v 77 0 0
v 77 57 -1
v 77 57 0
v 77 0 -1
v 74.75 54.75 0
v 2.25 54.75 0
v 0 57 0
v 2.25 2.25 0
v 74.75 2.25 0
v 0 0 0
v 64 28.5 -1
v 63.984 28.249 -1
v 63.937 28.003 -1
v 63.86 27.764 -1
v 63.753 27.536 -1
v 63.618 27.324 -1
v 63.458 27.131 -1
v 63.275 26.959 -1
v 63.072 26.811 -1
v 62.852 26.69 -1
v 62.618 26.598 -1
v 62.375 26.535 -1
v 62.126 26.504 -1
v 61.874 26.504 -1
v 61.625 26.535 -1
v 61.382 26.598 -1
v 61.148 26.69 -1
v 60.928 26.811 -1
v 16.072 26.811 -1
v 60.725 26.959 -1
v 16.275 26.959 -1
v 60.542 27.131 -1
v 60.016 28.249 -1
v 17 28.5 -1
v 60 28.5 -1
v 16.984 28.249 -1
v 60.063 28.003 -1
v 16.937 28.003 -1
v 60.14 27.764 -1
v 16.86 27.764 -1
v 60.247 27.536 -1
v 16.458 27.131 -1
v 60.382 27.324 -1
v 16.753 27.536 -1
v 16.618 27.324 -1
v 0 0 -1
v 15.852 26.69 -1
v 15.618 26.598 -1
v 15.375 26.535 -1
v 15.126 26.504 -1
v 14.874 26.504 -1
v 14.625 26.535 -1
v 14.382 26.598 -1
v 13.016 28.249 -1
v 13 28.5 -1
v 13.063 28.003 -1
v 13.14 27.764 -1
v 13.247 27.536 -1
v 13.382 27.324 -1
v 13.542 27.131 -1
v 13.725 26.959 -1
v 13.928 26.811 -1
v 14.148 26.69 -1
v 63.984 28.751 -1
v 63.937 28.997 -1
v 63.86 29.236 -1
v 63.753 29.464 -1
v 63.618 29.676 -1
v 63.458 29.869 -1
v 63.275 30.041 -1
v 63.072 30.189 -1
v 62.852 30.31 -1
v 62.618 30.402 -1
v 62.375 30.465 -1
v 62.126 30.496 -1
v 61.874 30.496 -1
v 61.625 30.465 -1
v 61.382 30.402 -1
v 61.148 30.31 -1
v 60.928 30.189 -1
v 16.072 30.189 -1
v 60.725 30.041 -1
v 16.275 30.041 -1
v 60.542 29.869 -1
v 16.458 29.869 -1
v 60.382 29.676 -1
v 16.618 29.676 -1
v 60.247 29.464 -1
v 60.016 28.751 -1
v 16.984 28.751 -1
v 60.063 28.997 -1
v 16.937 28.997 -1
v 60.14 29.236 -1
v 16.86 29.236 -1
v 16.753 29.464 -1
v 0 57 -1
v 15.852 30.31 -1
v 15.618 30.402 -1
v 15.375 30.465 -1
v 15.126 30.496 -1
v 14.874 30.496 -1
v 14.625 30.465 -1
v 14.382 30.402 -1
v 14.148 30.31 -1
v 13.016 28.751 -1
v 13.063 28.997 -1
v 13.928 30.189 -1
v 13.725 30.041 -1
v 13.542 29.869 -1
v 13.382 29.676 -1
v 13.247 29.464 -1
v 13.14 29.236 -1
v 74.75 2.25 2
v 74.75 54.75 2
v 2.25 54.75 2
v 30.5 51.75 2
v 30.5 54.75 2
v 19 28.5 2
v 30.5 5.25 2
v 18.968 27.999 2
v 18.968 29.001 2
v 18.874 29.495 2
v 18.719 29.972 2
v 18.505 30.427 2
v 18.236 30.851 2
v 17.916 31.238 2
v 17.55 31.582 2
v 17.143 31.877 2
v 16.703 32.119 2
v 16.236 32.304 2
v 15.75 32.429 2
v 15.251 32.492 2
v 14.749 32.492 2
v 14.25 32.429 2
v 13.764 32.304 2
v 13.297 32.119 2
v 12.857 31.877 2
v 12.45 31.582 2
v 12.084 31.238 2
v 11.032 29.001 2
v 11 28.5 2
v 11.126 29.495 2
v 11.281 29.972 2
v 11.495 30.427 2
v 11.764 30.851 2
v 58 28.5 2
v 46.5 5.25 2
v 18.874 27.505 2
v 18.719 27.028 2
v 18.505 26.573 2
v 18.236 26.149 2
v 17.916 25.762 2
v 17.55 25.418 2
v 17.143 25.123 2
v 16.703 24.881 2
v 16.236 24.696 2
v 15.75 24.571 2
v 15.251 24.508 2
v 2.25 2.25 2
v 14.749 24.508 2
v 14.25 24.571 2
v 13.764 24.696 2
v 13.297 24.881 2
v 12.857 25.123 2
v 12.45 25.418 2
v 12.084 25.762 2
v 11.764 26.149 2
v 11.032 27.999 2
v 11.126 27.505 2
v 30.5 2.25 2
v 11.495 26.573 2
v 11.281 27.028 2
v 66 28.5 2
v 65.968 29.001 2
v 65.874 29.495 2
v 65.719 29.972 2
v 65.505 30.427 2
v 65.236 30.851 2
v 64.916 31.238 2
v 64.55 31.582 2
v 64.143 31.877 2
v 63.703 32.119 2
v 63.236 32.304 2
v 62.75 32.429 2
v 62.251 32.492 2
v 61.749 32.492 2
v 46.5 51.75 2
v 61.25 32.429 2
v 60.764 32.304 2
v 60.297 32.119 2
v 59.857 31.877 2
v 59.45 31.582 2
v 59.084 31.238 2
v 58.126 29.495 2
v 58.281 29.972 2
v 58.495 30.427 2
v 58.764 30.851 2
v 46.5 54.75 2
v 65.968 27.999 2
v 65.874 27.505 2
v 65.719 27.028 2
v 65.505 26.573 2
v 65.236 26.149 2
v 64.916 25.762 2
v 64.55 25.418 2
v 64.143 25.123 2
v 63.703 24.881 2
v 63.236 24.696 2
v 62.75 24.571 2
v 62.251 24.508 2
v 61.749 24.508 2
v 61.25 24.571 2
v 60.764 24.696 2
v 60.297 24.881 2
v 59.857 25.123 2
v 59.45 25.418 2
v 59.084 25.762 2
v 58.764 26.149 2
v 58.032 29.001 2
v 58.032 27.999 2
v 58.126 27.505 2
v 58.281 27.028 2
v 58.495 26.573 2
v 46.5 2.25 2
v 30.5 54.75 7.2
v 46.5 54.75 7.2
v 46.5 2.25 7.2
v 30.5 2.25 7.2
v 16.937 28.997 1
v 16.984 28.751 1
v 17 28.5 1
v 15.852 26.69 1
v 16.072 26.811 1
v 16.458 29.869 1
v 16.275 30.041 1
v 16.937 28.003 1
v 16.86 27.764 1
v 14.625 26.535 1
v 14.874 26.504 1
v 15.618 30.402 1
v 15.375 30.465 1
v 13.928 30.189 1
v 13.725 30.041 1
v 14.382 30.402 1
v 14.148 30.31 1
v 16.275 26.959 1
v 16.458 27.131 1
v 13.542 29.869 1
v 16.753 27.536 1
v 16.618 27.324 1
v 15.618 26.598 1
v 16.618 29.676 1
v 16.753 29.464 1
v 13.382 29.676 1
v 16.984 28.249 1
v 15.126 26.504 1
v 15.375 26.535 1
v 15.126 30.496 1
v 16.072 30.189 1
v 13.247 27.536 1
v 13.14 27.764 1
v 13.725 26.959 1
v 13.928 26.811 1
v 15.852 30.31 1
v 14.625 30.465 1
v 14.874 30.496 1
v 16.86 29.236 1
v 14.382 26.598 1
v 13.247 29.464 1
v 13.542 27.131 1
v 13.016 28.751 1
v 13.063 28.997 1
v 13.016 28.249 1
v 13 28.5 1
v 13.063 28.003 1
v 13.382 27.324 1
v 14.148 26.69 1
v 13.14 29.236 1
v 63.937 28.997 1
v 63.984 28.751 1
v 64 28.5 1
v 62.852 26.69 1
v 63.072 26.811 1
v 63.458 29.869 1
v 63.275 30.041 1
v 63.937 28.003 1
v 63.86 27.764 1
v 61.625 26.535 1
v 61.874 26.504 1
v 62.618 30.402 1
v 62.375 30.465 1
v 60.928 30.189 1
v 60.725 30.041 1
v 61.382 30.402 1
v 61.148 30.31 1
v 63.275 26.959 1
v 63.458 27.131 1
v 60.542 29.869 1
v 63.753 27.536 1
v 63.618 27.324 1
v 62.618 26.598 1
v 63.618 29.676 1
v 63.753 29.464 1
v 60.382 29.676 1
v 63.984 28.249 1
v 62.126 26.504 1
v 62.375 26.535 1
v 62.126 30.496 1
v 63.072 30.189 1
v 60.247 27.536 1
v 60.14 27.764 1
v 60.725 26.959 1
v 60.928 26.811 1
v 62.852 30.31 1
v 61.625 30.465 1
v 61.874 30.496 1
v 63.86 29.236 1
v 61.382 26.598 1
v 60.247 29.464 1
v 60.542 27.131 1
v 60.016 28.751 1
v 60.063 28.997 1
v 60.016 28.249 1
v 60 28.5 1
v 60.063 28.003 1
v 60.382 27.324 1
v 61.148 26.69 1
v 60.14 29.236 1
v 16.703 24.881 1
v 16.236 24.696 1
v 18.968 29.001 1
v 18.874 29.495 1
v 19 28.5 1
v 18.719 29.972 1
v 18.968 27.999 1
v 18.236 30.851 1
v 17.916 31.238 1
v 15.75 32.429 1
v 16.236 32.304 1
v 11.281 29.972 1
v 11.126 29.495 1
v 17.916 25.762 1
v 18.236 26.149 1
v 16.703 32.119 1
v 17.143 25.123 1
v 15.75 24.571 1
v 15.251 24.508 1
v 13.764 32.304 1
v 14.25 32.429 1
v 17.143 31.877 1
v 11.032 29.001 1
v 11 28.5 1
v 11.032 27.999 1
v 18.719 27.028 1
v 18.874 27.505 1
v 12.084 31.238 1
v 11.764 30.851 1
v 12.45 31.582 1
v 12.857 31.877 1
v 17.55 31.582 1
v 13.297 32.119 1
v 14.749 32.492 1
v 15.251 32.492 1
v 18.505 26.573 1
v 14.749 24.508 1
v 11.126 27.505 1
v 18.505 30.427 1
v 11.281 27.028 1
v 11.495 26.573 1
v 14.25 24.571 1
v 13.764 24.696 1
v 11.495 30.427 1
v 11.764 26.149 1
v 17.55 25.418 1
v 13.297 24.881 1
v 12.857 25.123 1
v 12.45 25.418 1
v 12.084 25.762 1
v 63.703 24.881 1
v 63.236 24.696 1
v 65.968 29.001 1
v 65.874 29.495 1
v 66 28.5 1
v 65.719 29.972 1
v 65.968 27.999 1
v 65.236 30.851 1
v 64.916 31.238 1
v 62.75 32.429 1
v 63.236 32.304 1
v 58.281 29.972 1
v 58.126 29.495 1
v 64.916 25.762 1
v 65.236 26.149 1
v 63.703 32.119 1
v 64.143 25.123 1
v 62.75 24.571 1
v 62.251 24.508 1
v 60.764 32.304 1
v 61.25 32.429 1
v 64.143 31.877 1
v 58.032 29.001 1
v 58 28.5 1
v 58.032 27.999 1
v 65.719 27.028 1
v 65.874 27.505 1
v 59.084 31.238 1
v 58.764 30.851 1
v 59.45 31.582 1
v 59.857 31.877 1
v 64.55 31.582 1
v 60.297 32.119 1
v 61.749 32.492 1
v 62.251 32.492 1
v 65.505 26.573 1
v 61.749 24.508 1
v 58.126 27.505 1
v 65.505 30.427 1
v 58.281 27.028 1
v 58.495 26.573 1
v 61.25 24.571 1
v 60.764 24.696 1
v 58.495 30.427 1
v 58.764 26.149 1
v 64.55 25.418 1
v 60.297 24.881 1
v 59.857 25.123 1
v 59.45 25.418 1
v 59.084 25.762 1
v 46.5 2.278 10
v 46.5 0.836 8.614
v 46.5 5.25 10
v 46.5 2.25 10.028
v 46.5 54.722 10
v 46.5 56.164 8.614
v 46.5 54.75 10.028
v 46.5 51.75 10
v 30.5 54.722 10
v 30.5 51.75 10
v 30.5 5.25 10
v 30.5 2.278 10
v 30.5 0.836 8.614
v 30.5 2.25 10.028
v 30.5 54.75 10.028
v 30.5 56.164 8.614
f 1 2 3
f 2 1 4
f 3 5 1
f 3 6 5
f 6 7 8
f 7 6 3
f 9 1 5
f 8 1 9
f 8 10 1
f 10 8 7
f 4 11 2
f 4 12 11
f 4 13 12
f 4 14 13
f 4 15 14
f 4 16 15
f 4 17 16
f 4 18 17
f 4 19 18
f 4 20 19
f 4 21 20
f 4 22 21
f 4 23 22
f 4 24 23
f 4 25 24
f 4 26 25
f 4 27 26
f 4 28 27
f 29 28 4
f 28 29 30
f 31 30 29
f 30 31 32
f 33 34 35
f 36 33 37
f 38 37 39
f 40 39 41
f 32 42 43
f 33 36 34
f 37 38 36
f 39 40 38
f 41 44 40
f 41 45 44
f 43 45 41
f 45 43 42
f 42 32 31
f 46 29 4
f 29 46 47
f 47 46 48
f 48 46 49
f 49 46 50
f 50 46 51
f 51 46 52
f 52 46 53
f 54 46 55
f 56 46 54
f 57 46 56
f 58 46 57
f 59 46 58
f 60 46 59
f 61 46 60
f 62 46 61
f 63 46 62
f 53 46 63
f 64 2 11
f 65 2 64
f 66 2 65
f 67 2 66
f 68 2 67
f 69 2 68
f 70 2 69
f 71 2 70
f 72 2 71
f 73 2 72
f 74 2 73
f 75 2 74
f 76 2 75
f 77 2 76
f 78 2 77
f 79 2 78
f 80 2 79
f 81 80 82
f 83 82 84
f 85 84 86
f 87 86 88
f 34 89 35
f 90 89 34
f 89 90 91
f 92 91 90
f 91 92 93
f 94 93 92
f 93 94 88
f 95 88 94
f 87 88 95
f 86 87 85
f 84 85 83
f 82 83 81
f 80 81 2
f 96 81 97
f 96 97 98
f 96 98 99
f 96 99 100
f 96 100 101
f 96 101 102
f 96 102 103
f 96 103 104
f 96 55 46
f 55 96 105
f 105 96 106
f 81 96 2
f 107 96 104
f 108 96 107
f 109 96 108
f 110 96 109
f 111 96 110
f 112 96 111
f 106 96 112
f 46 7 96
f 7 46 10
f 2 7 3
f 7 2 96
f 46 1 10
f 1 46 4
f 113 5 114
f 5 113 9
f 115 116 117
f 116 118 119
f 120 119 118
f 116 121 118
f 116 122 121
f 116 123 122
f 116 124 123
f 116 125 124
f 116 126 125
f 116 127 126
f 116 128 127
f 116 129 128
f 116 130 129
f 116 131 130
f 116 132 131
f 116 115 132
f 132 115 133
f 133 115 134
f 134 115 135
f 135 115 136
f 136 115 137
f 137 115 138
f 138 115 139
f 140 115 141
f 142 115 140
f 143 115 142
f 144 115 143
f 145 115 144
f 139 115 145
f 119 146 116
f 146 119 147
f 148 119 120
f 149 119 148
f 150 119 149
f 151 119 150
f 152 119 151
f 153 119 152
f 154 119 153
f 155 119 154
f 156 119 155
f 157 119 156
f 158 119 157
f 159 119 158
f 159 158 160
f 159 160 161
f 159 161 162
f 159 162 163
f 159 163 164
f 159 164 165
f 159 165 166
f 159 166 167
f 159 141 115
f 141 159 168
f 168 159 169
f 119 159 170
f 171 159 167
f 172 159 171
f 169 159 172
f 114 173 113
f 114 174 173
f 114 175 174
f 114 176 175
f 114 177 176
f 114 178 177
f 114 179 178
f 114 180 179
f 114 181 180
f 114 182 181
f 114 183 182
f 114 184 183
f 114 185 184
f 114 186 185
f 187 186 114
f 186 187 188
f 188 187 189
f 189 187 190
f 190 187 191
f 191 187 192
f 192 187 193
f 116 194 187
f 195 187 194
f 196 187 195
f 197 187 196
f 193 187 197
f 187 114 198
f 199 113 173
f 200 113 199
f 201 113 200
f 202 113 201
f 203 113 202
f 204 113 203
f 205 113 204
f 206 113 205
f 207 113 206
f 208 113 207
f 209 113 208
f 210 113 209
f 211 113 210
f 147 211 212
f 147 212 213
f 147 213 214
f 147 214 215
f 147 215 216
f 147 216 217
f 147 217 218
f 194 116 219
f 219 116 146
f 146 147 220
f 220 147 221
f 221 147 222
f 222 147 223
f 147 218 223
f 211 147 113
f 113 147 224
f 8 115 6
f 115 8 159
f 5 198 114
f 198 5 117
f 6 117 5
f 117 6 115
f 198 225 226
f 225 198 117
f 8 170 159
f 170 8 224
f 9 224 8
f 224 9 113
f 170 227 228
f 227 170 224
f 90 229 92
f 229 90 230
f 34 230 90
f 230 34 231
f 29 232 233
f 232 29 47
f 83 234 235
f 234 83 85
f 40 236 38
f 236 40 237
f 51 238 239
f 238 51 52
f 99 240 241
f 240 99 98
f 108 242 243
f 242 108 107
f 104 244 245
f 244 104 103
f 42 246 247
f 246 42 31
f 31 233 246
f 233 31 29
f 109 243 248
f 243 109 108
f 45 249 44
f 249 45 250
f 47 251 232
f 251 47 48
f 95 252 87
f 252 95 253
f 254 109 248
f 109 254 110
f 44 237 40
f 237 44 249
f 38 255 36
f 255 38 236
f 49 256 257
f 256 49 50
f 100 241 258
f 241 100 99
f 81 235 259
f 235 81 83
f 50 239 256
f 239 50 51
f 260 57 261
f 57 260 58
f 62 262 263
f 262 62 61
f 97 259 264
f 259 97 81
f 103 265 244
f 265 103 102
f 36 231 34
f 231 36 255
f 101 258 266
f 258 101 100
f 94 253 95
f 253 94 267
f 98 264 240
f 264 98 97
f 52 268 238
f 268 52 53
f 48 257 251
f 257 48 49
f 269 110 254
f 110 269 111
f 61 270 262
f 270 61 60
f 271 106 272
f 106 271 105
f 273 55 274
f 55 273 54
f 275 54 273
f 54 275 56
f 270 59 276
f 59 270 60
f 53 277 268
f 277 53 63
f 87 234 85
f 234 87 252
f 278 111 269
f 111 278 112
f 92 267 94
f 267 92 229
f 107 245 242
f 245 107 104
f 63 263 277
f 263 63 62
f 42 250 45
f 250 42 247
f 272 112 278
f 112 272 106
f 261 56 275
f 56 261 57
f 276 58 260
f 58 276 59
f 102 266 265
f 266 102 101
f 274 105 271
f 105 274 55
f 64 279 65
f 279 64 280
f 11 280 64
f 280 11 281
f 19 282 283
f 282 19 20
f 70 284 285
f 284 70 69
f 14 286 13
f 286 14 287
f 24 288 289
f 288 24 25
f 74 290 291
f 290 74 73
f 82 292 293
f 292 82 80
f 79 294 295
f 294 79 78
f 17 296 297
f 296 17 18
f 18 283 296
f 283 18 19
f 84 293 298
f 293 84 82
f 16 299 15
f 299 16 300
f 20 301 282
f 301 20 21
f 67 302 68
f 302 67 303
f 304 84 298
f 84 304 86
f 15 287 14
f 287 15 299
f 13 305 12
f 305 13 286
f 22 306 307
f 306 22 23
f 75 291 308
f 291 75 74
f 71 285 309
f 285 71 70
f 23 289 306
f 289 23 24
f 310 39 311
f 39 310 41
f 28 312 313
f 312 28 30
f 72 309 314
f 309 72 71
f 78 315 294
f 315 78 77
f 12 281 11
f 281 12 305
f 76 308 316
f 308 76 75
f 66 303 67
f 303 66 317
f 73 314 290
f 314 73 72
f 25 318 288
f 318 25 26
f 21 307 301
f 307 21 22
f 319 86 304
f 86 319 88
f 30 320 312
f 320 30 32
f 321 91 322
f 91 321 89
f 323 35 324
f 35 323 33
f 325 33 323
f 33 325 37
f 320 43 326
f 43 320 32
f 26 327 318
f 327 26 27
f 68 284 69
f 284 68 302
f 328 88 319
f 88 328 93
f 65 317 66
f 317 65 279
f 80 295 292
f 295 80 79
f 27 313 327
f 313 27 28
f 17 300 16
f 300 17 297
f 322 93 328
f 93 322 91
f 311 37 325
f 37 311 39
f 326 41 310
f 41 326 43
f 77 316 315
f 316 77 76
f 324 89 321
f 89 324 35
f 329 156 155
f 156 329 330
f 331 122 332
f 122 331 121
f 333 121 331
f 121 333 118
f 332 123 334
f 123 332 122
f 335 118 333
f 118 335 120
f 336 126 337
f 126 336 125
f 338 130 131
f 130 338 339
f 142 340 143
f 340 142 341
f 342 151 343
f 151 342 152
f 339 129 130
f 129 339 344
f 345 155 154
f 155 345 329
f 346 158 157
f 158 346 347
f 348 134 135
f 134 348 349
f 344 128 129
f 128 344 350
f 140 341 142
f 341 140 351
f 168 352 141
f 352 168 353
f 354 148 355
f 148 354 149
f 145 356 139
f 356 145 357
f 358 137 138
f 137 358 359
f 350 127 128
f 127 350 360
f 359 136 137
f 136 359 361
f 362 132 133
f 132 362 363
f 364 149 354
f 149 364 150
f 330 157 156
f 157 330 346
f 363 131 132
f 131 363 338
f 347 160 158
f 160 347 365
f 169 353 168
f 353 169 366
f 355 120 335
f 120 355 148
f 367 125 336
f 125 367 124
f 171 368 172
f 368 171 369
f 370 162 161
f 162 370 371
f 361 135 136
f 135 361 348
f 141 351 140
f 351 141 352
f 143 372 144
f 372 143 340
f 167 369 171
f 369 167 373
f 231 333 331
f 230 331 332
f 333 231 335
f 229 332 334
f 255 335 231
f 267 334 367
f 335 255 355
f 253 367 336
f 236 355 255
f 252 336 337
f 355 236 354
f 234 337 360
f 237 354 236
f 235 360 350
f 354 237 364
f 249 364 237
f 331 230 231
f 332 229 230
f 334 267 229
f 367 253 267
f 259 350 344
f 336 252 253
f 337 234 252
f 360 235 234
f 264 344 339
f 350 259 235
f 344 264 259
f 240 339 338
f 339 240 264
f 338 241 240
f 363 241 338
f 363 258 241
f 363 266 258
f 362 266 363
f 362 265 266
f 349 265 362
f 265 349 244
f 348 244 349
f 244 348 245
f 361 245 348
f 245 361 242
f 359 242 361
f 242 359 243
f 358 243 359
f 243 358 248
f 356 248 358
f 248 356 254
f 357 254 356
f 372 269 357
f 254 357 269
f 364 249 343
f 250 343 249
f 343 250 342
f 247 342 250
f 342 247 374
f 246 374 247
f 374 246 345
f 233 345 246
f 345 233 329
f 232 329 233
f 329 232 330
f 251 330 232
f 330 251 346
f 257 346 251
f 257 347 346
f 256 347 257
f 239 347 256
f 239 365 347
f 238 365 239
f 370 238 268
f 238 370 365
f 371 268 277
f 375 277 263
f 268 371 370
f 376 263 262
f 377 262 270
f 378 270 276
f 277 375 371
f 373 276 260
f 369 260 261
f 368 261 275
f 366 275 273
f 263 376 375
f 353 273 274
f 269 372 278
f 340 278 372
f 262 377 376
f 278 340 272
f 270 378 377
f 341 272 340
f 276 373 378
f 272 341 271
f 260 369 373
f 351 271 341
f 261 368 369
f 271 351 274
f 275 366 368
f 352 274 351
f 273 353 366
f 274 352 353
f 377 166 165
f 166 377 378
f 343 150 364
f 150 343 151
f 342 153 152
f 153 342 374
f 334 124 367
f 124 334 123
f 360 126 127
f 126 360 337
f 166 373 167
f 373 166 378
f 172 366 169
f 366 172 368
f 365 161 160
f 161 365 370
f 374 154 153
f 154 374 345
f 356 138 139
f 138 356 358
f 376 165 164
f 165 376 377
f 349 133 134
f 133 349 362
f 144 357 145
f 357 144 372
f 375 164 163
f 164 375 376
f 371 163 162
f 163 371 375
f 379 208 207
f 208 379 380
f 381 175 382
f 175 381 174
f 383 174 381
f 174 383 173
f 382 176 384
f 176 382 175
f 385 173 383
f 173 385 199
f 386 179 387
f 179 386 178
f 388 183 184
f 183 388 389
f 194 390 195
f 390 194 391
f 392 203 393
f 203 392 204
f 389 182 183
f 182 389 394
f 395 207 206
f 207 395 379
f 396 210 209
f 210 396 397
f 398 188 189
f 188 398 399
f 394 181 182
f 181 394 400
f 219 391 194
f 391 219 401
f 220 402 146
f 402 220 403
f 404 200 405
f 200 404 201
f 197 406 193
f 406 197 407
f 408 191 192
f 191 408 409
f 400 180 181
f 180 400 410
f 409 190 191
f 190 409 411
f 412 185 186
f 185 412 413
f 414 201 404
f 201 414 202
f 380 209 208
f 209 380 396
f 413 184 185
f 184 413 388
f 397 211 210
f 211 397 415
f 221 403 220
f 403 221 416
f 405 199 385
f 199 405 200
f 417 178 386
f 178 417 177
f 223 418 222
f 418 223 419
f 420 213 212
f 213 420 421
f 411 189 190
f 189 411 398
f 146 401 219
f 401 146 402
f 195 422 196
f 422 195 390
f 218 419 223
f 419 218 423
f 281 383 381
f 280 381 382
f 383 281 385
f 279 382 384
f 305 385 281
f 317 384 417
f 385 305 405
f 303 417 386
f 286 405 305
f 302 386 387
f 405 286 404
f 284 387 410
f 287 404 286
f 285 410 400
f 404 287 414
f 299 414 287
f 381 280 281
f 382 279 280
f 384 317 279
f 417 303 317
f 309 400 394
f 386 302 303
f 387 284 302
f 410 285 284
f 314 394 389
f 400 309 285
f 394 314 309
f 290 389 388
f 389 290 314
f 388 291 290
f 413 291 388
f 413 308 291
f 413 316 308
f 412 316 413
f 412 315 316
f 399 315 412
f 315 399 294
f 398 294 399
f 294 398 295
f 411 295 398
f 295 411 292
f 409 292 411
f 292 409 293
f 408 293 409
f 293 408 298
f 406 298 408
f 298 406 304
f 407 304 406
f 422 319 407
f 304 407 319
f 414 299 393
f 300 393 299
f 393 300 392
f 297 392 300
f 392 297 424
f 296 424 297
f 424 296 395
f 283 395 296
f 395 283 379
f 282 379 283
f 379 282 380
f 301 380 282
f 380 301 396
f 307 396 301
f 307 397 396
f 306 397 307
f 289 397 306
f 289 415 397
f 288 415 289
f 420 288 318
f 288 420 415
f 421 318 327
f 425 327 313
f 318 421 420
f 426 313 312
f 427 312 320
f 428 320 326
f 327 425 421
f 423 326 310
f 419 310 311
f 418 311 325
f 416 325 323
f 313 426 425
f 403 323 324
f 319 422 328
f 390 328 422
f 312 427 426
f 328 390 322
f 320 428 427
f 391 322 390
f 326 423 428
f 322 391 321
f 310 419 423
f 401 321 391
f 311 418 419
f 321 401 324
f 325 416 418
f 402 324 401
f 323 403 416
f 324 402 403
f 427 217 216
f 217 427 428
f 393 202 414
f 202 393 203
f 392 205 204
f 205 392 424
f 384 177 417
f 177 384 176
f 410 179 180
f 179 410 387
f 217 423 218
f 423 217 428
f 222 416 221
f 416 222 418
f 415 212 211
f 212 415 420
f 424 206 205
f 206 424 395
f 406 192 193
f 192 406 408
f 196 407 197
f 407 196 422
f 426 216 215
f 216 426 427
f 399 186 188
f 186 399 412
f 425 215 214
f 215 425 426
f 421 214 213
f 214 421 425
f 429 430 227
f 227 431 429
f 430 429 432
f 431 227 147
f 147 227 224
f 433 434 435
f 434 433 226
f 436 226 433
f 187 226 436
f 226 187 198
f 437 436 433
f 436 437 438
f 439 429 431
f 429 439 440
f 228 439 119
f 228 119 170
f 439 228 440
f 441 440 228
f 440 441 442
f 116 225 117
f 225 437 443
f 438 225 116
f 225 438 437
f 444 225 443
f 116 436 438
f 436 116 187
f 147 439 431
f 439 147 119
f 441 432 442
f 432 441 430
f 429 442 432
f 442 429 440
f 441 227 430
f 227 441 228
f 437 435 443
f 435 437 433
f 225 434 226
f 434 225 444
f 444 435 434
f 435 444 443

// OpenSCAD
//Humidity sensor project box

$fn = 50;

/* Comment or uncomment the following lines to see each piece on its own
 * You can also add a translate() to one line to move the plate next to the
 * cover for viewing both.  I did it this way to export both as separate 
 * .stl files
 */
//cover();
wall_plate();

module wall_plate() {
    //Create the base platform with mounting holes
    difference() {
        union() {
            translate([0, 0, -1]) cube([77, 57, 1]);
            translate([2.25, 2.25, 0]) cube([72.5, 52.5, 2]);
        }
        translate([15, 28.5, -2]) cylinder(d=4, h=5);
        translate([62, 28.5, -2]) cylinder(d=4, h=5);
        
        translate([15, 28.5, 1]) cylinder(d=8, h=2);
        translate([62, 28.5, 1]) cylinder(d=8, h=2);
    }
    
    //Create the snap tab uprights
    difference() {
        translate([30.5, 2.25, 0]) cube([16, 52.5, 10]);
        
        translate([30.5, 5.25, 0]) cube([16, 46.5, 10]);
    }
    
    //Create the latches
    translate([30.5, 2.25, 7.2]) rotate([45, 0, 0]) cube([16, 2, 2]);
    translate([30.5, 54.75, 7.2]) rotate([45, 0, 0]) cube([16, 2, 2]);
}

module cover() {
    //Create the main vented box
    difference() {
        //Create the outer box layers
        union() {
            translate([2, 2, 0]) cube([73, 53, 49]);
            cube([77, 57, 33]);
        }
        //Hollow out the box
        translate([4, 4, 0]) cube([69, 49, 47]);
        translate([2, 2, 0]) cube([73, 53, 28]);
        
        //Create the latch reliefs
        translate([29.5, 2.25, 7.2]) rotate([45, 0, 0]) cube([18, 2, 2]);
        translate([29.5, 54.75, 7.2]) rotate([45, 0, 0]) cube([18, 2, 2]);
        
        //Add the horizontal vent slots to the top layer
        translate([5, 2, 28]) cube([2, 53, 18]);
        translate([10, 2, 28]) cube([2, 53, 18]);
        translate([15, 2, 28]) cube([2, 53, 18]);
        translate([20, 2, 28]) cube([2, 53, 18]);
        translate([25, 2, 28]) cube([2, 53, 18]);
        translate([30, 2, 28]) cube([2, 53, 18]);
        translate([35, 2, 28]) cube([2, 53, 18]);
        translate([40, 2, 28]) cube([2, 53, 18]);
        translate([45, 2, 28]) cube([2, 53, 18]);
        translate([50, 2, 28]) cube([2, 53, 18]);
        translate([55, 2, 28]) cube([2, 53, 18]);
        translate([60, 2, 28]) cube([2, 53, 18]);
        translate([65, 2, 28]) cube([2, 53, 18]);
        translate([70, 2, 28]) cube([2, 53, 18]);
        //Add the vertical vent slots to the top layer
        translate([2, 5, 28]) cube([73, 2, 18]);
        translate([2, 10, 28]) cube([73, 2, 18]);
        translate([2, 15, 28]) cube([73, 2, 18]);
        translate([2, 20, 28]) cube([73, 2, 18]);
        translate([2, 25, 28]) cube([73, 2, 18]);
        translate([2, 30, 28]) cube([73, 2, 18]);
        translate([2, 35, 28]) cube([73, 2, 18]);
        translate([2, 40, 28]) cube([73, 2, 18]);
        translate([2, 45, 28]) cube([73, 2, 18]);
        translate([2, 50, 28]) cube([73, 2, 18]);
    }

    //Create the battery case holder
    difference() {
        translate([2, 7.75, 2]) cube([73, 41.5, 22.5]);
        
        translate([8.75, 7.75, 2]) cube([60, 41.5, 22.5]);
        translate([3.75, 11, 2]) cube([69.25, 34.25, 18.3]);
        
        translate([2, 20, 0]) cube([10, 16.5, 25]);
        
    }

    //Create the mounting tabs for the PCB
    difference() {    
        translate([15, 2, 23]) cube([52.75, 55, 5]);
        
        translate([19.5, 6.5, 23]) cube([43.75, 44, 5]);
        translate([22, 2, 23]) cube([38.75, 55, 5]);
        translate([14, 9.5, 23]) cube([54.75, 38, 5]);
        
        translate([18.5, 5.5, 23]) cylinder(d=1, h=5);
        translate([64, 5.5, 23]) cylinder(d=1, h=5);
        translate([18.5, 51.5, 23]) cylinder(d=1, h=5);
        translate([64, 51.5, 23]) cylinder(d=1, h=5);
    }
}
